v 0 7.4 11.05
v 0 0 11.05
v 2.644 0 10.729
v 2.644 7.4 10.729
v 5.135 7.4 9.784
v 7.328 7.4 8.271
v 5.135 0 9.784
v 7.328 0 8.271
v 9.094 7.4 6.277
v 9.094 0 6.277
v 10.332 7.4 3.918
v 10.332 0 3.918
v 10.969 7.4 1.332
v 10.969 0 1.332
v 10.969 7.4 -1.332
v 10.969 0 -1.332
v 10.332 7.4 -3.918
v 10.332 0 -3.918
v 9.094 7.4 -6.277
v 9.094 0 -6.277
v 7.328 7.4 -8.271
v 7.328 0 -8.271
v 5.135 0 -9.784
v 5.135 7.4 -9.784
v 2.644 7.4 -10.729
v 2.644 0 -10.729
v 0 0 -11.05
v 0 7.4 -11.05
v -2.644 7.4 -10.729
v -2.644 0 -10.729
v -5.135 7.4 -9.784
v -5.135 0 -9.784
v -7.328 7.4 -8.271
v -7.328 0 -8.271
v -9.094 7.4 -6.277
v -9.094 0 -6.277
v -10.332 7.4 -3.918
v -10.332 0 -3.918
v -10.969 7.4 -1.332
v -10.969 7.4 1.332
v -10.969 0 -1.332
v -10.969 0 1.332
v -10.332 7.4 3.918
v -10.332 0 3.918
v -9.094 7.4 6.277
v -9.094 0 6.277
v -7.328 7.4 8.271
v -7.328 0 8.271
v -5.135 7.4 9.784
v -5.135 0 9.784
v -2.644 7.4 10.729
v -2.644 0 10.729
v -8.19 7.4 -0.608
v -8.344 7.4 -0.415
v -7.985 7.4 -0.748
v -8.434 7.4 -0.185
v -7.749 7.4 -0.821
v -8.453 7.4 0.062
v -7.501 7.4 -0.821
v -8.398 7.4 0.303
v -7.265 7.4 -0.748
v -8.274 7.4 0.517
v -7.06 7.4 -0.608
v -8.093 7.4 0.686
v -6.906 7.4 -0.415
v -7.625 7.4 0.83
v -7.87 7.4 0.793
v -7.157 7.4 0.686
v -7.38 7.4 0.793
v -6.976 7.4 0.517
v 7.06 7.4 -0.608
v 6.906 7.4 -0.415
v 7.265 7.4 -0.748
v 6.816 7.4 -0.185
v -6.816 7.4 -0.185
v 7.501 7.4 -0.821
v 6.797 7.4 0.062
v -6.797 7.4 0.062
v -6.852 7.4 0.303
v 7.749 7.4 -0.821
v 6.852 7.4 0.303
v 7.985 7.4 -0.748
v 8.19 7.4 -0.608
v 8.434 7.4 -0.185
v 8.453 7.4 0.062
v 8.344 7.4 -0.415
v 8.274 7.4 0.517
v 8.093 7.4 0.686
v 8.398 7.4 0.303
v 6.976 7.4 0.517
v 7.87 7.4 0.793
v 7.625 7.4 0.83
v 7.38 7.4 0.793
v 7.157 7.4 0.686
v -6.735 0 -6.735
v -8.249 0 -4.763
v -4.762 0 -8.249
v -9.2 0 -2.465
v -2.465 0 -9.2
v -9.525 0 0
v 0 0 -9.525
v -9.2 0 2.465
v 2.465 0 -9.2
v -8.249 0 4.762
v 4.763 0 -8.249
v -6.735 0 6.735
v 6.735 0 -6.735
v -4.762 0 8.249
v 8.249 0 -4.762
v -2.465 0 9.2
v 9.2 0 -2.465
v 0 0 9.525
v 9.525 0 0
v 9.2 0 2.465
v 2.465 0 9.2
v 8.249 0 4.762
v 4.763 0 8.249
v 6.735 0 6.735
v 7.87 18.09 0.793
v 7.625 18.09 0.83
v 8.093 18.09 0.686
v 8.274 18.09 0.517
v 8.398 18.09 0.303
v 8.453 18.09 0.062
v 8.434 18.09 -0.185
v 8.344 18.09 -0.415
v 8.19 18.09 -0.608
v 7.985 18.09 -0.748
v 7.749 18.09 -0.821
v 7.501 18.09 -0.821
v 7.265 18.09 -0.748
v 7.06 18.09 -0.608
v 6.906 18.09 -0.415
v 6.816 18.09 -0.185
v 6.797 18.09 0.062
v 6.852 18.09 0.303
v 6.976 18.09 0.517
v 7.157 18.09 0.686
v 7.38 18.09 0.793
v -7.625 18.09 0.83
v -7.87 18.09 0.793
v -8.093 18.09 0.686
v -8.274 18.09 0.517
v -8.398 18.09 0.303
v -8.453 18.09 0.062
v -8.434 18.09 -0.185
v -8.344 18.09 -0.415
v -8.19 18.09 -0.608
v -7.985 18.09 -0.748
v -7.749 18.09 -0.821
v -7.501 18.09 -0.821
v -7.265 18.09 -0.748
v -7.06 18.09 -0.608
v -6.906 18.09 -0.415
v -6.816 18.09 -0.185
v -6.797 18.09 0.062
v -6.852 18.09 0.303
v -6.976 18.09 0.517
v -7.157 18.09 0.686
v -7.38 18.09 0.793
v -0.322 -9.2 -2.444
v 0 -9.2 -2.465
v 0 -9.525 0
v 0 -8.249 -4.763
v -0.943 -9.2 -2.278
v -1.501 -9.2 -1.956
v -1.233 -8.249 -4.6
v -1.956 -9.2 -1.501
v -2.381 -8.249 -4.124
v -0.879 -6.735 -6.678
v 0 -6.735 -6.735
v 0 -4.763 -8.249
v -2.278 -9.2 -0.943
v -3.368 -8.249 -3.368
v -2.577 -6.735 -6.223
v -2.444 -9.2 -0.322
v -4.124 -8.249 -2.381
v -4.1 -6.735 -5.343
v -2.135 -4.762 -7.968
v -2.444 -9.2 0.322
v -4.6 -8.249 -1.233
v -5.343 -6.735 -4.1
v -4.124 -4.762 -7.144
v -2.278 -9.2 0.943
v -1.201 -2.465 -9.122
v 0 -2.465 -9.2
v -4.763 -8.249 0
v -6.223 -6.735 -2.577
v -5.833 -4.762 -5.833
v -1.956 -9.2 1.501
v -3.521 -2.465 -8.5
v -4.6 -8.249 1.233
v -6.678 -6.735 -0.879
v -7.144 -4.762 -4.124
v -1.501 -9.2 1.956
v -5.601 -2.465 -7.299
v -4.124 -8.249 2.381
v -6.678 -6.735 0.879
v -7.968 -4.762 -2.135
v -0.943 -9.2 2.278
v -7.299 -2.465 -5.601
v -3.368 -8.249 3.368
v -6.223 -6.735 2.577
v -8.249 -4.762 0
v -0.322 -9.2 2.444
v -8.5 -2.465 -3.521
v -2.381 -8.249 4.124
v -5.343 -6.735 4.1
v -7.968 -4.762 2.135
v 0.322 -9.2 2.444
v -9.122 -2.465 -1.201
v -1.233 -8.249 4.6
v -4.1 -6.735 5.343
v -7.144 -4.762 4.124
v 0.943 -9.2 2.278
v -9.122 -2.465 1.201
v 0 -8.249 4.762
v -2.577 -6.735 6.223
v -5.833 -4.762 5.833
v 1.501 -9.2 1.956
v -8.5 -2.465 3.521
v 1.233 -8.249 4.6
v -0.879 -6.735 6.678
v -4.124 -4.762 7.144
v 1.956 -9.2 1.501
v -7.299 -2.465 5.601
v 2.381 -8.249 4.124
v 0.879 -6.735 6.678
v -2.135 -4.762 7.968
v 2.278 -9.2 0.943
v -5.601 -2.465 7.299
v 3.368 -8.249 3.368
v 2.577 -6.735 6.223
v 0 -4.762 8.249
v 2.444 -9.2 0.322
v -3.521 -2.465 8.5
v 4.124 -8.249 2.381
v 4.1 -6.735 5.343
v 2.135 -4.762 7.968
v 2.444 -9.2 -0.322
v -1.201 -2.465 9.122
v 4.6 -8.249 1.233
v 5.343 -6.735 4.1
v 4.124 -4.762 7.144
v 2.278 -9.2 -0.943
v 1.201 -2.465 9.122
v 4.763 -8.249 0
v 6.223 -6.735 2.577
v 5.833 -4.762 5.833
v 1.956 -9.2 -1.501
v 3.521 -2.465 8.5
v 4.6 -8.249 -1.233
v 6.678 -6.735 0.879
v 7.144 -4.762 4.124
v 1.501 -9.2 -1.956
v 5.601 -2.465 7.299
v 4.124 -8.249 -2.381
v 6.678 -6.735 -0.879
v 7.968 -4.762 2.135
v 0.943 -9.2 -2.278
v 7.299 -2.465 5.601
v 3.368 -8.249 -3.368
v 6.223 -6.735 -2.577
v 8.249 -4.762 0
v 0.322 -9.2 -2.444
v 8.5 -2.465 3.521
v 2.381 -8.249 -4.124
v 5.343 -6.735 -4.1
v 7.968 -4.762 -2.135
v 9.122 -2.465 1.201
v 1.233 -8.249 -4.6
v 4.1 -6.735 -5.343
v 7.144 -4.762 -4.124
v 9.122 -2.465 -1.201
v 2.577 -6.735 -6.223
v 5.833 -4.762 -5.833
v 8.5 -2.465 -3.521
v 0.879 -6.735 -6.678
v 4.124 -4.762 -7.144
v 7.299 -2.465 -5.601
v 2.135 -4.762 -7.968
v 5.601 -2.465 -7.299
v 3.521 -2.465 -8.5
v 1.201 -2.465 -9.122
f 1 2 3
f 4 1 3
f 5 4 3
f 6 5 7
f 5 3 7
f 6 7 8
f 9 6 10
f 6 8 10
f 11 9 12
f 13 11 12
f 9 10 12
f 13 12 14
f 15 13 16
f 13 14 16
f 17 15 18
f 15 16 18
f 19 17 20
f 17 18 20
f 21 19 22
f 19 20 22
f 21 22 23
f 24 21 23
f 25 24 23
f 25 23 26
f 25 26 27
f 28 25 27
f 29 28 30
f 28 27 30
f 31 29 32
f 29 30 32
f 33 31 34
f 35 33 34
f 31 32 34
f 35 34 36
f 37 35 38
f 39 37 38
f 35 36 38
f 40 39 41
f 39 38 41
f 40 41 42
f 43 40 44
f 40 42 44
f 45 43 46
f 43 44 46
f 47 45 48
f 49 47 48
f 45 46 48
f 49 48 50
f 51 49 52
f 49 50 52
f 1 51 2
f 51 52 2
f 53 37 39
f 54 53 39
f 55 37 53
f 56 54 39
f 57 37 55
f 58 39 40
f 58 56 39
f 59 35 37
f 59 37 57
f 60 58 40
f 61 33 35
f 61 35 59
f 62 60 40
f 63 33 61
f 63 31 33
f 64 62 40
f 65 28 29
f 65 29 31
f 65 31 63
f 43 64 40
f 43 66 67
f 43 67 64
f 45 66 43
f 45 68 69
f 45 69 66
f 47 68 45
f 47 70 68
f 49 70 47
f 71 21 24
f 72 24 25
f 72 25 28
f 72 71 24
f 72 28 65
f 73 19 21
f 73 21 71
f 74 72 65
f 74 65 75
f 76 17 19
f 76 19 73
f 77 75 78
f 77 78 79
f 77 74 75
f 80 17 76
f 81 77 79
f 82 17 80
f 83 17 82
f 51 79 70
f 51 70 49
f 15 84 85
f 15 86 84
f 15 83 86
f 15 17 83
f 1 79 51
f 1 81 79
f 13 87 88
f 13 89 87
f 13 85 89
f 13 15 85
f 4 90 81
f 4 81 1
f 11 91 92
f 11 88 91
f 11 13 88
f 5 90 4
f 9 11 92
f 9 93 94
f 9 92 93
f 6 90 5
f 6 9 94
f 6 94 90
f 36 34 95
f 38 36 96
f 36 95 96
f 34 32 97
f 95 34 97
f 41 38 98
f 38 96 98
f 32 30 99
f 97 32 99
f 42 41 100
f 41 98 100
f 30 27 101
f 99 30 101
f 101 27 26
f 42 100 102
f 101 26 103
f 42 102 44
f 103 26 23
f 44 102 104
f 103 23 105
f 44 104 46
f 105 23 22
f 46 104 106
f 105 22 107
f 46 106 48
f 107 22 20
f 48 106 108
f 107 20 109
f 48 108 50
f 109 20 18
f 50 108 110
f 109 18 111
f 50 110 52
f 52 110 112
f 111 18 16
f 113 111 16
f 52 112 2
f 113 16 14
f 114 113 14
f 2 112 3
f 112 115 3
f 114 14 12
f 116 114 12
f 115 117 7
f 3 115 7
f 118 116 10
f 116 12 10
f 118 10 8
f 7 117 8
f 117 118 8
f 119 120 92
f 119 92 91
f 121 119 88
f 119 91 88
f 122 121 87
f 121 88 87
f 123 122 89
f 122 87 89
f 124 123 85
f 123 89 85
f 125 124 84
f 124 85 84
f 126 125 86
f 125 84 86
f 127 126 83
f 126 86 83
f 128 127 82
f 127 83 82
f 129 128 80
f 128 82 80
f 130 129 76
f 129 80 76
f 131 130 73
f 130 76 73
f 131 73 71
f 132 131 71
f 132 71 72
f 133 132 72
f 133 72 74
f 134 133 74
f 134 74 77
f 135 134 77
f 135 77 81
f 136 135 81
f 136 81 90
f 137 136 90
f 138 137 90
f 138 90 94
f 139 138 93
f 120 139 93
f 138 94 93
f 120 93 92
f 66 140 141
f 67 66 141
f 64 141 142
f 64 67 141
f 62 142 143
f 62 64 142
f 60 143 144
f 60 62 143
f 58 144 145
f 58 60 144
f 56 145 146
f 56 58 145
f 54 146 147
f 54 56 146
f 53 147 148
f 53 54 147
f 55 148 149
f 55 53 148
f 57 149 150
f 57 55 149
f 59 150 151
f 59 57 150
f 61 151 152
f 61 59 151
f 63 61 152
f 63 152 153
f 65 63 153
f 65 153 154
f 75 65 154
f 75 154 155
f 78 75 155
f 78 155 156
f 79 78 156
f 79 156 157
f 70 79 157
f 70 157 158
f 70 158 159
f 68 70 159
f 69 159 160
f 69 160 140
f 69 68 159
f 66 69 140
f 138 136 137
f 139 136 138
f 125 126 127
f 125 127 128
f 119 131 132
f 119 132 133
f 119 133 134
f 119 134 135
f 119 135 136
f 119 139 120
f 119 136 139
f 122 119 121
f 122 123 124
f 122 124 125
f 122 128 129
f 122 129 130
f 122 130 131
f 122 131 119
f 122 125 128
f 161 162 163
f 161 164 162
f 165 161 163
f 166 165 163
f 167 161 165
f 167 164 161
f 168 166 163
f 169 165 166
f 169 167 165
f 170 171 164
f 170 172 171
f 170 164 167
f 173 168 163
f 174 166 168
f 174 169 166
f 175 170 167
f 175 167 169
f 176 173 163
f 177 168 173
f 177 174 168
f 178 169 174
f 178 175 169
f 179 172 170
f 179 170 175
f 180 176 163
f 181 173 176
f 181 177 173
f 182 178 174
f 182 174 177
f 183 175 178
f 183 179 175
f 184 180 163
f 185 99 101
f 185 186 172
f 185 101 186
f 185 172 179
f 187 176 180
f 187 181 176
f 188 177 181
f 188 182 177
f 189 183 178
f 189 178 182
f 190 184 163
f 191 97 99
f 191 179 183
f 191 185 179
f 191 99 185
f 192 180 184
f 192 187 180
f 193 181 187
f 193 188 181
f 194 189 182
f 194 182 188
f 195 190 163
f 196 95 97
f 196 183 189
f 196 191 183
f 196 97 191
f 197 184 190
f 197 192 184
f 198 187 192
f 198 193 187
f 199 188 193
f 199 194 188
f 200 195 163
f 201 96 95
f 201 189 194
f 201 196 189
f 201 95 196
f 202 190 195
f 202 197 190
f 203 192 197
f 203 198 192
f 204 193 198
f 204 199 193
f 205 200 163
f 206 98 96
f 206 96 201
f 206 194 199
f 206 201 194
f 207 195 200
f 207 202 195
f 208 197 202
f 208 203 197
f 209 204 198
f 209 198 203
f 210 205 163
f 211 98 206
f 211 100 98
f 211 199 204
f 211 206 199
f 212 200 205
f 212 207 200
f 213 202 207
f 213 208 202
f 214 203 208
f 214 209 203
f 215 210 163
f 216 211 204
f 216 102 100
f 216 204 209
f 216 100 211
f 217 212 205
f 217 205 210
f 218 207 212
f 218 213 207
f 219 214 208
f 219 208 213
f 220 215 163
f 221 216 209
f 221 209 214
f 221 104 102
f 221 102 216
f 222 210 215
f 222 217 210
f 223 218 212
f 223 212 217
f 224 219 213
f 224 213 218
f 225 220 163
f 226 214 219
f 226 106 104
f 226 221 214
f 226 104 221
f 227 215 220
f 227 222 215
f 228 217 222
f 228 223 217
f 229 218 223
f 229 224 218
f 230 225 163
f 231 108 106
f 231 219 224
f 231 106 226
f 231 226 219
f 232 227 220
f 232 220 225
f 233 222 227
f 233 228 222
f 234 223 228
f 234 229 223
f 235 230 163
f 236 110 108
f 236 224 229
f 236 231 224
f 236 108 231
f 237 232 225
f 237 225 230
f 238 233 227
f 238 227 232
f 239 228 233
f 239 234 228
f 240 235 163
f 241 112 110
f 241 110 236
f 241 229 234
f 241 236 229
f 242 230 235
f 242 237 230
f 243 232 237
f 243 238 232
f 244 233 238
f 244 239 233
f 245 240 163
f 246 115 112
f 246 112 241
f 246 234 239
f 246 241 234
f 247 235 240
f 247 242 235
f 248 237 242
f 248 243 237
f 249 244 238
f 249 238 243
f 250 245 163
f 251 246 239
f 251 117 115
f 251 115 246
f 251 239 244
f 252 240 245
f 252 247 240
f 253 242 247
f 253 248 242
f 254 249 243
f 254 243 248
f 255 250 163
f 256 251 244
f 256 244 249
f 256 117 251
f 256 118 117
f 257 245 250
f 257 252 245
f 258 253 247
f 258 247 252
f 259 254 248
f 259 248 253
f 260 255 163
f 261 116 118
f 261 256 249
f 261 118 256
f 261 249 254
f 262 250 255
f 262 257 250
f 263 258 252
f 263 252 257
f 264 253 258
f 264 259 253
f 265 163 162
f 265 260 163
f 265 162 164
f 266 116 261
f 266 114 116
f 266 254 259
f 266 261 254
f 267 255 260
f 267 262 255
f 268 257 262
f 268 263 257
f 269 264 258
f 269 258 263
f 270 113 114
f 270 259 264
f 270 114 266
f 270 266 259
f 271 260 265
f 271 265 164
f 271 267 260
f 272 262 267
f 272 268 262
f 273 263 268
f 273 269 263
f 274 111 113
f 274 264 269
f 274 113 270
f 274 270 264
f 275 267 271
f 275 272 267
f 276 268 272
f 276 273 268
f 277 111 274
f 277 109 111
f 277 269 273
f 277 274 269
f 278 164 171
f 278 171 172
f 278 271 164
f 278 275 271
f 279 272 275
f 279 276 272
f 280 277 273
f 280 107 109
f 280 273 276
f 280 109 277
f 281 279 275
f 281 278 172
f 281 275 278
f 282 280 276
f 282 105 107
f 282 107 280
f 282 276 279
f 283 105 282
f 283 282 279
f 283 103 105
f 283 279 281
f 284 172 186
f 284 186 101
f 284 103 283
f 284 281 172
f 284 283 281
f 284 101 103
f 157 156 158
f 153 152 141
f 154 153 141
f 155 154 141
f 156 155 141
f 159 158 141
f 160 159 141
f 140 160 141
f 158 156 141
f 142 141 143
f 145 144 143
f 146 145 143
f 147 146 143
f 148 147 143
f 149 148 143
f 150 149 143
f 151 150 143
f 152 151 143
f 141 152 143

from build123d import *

# Parameters (mm, degrees)
SKETCH1_R           = 11.05
BOSS_EXTRUDE1_DEPTH = 7.4
SKETCH3_R           = 0.83
BOSS_EXTRUDE2_DEPTH = 10.69


with BuildPart() as part:
    # Sketch1 → Boss-Extrude1 (new body)
    with BuildSketch(Plane(origin=(0, 0, 0), x_dir=(1, 0, 0), z_dir=(0, 1, 0))):
        with Locations(Location((0, 0, 0), (0, 0, 270))):
            Circle(SKETCH1_R)
    extrude(amount=BOSS_EXTRUDE1_DEPTH)

    # Sketch2 → Revolve1 (revolve)
    with BuildSketch(Plane(origin=(0, 0, 0), x_dir=(0, 0, -1), z_dir=(1, 0, 0))):
        with BuildLine():
            Line((0, 0), (0, -9.525))
            ThreePointArc((0, -9.525), (6.735192091, -6.735192091), (9.525, 0))
            Line((9.525, 0), (0, 0))
        make_face()
    revolve(axis=Axis((0, 0, 0), (0, 1, 0)))

    # Sketch3 → Boss-Extrude2 (add)
    with BuildSketch(Plane(origin=(0, 7.4, 0), x_dir=(1, 0, 0), z_dir=(0, 1, 0))):
        with Locations(Location((7.625, 0, 0), (0, 0, 270))):
            Circle(SKETCH3_R)
    boss_extrude2 = extrude(amount=BOSS_EXTRUDE2_DEPTH)

    # Mirror1: Boss-Extrude2 across plane
    add(boss_extrude2.mirror(Plane(origin=(0, 0, 0), x_dir=(0, 0, 1), z_dir=(1, 0, 0))))


solid = part.part
